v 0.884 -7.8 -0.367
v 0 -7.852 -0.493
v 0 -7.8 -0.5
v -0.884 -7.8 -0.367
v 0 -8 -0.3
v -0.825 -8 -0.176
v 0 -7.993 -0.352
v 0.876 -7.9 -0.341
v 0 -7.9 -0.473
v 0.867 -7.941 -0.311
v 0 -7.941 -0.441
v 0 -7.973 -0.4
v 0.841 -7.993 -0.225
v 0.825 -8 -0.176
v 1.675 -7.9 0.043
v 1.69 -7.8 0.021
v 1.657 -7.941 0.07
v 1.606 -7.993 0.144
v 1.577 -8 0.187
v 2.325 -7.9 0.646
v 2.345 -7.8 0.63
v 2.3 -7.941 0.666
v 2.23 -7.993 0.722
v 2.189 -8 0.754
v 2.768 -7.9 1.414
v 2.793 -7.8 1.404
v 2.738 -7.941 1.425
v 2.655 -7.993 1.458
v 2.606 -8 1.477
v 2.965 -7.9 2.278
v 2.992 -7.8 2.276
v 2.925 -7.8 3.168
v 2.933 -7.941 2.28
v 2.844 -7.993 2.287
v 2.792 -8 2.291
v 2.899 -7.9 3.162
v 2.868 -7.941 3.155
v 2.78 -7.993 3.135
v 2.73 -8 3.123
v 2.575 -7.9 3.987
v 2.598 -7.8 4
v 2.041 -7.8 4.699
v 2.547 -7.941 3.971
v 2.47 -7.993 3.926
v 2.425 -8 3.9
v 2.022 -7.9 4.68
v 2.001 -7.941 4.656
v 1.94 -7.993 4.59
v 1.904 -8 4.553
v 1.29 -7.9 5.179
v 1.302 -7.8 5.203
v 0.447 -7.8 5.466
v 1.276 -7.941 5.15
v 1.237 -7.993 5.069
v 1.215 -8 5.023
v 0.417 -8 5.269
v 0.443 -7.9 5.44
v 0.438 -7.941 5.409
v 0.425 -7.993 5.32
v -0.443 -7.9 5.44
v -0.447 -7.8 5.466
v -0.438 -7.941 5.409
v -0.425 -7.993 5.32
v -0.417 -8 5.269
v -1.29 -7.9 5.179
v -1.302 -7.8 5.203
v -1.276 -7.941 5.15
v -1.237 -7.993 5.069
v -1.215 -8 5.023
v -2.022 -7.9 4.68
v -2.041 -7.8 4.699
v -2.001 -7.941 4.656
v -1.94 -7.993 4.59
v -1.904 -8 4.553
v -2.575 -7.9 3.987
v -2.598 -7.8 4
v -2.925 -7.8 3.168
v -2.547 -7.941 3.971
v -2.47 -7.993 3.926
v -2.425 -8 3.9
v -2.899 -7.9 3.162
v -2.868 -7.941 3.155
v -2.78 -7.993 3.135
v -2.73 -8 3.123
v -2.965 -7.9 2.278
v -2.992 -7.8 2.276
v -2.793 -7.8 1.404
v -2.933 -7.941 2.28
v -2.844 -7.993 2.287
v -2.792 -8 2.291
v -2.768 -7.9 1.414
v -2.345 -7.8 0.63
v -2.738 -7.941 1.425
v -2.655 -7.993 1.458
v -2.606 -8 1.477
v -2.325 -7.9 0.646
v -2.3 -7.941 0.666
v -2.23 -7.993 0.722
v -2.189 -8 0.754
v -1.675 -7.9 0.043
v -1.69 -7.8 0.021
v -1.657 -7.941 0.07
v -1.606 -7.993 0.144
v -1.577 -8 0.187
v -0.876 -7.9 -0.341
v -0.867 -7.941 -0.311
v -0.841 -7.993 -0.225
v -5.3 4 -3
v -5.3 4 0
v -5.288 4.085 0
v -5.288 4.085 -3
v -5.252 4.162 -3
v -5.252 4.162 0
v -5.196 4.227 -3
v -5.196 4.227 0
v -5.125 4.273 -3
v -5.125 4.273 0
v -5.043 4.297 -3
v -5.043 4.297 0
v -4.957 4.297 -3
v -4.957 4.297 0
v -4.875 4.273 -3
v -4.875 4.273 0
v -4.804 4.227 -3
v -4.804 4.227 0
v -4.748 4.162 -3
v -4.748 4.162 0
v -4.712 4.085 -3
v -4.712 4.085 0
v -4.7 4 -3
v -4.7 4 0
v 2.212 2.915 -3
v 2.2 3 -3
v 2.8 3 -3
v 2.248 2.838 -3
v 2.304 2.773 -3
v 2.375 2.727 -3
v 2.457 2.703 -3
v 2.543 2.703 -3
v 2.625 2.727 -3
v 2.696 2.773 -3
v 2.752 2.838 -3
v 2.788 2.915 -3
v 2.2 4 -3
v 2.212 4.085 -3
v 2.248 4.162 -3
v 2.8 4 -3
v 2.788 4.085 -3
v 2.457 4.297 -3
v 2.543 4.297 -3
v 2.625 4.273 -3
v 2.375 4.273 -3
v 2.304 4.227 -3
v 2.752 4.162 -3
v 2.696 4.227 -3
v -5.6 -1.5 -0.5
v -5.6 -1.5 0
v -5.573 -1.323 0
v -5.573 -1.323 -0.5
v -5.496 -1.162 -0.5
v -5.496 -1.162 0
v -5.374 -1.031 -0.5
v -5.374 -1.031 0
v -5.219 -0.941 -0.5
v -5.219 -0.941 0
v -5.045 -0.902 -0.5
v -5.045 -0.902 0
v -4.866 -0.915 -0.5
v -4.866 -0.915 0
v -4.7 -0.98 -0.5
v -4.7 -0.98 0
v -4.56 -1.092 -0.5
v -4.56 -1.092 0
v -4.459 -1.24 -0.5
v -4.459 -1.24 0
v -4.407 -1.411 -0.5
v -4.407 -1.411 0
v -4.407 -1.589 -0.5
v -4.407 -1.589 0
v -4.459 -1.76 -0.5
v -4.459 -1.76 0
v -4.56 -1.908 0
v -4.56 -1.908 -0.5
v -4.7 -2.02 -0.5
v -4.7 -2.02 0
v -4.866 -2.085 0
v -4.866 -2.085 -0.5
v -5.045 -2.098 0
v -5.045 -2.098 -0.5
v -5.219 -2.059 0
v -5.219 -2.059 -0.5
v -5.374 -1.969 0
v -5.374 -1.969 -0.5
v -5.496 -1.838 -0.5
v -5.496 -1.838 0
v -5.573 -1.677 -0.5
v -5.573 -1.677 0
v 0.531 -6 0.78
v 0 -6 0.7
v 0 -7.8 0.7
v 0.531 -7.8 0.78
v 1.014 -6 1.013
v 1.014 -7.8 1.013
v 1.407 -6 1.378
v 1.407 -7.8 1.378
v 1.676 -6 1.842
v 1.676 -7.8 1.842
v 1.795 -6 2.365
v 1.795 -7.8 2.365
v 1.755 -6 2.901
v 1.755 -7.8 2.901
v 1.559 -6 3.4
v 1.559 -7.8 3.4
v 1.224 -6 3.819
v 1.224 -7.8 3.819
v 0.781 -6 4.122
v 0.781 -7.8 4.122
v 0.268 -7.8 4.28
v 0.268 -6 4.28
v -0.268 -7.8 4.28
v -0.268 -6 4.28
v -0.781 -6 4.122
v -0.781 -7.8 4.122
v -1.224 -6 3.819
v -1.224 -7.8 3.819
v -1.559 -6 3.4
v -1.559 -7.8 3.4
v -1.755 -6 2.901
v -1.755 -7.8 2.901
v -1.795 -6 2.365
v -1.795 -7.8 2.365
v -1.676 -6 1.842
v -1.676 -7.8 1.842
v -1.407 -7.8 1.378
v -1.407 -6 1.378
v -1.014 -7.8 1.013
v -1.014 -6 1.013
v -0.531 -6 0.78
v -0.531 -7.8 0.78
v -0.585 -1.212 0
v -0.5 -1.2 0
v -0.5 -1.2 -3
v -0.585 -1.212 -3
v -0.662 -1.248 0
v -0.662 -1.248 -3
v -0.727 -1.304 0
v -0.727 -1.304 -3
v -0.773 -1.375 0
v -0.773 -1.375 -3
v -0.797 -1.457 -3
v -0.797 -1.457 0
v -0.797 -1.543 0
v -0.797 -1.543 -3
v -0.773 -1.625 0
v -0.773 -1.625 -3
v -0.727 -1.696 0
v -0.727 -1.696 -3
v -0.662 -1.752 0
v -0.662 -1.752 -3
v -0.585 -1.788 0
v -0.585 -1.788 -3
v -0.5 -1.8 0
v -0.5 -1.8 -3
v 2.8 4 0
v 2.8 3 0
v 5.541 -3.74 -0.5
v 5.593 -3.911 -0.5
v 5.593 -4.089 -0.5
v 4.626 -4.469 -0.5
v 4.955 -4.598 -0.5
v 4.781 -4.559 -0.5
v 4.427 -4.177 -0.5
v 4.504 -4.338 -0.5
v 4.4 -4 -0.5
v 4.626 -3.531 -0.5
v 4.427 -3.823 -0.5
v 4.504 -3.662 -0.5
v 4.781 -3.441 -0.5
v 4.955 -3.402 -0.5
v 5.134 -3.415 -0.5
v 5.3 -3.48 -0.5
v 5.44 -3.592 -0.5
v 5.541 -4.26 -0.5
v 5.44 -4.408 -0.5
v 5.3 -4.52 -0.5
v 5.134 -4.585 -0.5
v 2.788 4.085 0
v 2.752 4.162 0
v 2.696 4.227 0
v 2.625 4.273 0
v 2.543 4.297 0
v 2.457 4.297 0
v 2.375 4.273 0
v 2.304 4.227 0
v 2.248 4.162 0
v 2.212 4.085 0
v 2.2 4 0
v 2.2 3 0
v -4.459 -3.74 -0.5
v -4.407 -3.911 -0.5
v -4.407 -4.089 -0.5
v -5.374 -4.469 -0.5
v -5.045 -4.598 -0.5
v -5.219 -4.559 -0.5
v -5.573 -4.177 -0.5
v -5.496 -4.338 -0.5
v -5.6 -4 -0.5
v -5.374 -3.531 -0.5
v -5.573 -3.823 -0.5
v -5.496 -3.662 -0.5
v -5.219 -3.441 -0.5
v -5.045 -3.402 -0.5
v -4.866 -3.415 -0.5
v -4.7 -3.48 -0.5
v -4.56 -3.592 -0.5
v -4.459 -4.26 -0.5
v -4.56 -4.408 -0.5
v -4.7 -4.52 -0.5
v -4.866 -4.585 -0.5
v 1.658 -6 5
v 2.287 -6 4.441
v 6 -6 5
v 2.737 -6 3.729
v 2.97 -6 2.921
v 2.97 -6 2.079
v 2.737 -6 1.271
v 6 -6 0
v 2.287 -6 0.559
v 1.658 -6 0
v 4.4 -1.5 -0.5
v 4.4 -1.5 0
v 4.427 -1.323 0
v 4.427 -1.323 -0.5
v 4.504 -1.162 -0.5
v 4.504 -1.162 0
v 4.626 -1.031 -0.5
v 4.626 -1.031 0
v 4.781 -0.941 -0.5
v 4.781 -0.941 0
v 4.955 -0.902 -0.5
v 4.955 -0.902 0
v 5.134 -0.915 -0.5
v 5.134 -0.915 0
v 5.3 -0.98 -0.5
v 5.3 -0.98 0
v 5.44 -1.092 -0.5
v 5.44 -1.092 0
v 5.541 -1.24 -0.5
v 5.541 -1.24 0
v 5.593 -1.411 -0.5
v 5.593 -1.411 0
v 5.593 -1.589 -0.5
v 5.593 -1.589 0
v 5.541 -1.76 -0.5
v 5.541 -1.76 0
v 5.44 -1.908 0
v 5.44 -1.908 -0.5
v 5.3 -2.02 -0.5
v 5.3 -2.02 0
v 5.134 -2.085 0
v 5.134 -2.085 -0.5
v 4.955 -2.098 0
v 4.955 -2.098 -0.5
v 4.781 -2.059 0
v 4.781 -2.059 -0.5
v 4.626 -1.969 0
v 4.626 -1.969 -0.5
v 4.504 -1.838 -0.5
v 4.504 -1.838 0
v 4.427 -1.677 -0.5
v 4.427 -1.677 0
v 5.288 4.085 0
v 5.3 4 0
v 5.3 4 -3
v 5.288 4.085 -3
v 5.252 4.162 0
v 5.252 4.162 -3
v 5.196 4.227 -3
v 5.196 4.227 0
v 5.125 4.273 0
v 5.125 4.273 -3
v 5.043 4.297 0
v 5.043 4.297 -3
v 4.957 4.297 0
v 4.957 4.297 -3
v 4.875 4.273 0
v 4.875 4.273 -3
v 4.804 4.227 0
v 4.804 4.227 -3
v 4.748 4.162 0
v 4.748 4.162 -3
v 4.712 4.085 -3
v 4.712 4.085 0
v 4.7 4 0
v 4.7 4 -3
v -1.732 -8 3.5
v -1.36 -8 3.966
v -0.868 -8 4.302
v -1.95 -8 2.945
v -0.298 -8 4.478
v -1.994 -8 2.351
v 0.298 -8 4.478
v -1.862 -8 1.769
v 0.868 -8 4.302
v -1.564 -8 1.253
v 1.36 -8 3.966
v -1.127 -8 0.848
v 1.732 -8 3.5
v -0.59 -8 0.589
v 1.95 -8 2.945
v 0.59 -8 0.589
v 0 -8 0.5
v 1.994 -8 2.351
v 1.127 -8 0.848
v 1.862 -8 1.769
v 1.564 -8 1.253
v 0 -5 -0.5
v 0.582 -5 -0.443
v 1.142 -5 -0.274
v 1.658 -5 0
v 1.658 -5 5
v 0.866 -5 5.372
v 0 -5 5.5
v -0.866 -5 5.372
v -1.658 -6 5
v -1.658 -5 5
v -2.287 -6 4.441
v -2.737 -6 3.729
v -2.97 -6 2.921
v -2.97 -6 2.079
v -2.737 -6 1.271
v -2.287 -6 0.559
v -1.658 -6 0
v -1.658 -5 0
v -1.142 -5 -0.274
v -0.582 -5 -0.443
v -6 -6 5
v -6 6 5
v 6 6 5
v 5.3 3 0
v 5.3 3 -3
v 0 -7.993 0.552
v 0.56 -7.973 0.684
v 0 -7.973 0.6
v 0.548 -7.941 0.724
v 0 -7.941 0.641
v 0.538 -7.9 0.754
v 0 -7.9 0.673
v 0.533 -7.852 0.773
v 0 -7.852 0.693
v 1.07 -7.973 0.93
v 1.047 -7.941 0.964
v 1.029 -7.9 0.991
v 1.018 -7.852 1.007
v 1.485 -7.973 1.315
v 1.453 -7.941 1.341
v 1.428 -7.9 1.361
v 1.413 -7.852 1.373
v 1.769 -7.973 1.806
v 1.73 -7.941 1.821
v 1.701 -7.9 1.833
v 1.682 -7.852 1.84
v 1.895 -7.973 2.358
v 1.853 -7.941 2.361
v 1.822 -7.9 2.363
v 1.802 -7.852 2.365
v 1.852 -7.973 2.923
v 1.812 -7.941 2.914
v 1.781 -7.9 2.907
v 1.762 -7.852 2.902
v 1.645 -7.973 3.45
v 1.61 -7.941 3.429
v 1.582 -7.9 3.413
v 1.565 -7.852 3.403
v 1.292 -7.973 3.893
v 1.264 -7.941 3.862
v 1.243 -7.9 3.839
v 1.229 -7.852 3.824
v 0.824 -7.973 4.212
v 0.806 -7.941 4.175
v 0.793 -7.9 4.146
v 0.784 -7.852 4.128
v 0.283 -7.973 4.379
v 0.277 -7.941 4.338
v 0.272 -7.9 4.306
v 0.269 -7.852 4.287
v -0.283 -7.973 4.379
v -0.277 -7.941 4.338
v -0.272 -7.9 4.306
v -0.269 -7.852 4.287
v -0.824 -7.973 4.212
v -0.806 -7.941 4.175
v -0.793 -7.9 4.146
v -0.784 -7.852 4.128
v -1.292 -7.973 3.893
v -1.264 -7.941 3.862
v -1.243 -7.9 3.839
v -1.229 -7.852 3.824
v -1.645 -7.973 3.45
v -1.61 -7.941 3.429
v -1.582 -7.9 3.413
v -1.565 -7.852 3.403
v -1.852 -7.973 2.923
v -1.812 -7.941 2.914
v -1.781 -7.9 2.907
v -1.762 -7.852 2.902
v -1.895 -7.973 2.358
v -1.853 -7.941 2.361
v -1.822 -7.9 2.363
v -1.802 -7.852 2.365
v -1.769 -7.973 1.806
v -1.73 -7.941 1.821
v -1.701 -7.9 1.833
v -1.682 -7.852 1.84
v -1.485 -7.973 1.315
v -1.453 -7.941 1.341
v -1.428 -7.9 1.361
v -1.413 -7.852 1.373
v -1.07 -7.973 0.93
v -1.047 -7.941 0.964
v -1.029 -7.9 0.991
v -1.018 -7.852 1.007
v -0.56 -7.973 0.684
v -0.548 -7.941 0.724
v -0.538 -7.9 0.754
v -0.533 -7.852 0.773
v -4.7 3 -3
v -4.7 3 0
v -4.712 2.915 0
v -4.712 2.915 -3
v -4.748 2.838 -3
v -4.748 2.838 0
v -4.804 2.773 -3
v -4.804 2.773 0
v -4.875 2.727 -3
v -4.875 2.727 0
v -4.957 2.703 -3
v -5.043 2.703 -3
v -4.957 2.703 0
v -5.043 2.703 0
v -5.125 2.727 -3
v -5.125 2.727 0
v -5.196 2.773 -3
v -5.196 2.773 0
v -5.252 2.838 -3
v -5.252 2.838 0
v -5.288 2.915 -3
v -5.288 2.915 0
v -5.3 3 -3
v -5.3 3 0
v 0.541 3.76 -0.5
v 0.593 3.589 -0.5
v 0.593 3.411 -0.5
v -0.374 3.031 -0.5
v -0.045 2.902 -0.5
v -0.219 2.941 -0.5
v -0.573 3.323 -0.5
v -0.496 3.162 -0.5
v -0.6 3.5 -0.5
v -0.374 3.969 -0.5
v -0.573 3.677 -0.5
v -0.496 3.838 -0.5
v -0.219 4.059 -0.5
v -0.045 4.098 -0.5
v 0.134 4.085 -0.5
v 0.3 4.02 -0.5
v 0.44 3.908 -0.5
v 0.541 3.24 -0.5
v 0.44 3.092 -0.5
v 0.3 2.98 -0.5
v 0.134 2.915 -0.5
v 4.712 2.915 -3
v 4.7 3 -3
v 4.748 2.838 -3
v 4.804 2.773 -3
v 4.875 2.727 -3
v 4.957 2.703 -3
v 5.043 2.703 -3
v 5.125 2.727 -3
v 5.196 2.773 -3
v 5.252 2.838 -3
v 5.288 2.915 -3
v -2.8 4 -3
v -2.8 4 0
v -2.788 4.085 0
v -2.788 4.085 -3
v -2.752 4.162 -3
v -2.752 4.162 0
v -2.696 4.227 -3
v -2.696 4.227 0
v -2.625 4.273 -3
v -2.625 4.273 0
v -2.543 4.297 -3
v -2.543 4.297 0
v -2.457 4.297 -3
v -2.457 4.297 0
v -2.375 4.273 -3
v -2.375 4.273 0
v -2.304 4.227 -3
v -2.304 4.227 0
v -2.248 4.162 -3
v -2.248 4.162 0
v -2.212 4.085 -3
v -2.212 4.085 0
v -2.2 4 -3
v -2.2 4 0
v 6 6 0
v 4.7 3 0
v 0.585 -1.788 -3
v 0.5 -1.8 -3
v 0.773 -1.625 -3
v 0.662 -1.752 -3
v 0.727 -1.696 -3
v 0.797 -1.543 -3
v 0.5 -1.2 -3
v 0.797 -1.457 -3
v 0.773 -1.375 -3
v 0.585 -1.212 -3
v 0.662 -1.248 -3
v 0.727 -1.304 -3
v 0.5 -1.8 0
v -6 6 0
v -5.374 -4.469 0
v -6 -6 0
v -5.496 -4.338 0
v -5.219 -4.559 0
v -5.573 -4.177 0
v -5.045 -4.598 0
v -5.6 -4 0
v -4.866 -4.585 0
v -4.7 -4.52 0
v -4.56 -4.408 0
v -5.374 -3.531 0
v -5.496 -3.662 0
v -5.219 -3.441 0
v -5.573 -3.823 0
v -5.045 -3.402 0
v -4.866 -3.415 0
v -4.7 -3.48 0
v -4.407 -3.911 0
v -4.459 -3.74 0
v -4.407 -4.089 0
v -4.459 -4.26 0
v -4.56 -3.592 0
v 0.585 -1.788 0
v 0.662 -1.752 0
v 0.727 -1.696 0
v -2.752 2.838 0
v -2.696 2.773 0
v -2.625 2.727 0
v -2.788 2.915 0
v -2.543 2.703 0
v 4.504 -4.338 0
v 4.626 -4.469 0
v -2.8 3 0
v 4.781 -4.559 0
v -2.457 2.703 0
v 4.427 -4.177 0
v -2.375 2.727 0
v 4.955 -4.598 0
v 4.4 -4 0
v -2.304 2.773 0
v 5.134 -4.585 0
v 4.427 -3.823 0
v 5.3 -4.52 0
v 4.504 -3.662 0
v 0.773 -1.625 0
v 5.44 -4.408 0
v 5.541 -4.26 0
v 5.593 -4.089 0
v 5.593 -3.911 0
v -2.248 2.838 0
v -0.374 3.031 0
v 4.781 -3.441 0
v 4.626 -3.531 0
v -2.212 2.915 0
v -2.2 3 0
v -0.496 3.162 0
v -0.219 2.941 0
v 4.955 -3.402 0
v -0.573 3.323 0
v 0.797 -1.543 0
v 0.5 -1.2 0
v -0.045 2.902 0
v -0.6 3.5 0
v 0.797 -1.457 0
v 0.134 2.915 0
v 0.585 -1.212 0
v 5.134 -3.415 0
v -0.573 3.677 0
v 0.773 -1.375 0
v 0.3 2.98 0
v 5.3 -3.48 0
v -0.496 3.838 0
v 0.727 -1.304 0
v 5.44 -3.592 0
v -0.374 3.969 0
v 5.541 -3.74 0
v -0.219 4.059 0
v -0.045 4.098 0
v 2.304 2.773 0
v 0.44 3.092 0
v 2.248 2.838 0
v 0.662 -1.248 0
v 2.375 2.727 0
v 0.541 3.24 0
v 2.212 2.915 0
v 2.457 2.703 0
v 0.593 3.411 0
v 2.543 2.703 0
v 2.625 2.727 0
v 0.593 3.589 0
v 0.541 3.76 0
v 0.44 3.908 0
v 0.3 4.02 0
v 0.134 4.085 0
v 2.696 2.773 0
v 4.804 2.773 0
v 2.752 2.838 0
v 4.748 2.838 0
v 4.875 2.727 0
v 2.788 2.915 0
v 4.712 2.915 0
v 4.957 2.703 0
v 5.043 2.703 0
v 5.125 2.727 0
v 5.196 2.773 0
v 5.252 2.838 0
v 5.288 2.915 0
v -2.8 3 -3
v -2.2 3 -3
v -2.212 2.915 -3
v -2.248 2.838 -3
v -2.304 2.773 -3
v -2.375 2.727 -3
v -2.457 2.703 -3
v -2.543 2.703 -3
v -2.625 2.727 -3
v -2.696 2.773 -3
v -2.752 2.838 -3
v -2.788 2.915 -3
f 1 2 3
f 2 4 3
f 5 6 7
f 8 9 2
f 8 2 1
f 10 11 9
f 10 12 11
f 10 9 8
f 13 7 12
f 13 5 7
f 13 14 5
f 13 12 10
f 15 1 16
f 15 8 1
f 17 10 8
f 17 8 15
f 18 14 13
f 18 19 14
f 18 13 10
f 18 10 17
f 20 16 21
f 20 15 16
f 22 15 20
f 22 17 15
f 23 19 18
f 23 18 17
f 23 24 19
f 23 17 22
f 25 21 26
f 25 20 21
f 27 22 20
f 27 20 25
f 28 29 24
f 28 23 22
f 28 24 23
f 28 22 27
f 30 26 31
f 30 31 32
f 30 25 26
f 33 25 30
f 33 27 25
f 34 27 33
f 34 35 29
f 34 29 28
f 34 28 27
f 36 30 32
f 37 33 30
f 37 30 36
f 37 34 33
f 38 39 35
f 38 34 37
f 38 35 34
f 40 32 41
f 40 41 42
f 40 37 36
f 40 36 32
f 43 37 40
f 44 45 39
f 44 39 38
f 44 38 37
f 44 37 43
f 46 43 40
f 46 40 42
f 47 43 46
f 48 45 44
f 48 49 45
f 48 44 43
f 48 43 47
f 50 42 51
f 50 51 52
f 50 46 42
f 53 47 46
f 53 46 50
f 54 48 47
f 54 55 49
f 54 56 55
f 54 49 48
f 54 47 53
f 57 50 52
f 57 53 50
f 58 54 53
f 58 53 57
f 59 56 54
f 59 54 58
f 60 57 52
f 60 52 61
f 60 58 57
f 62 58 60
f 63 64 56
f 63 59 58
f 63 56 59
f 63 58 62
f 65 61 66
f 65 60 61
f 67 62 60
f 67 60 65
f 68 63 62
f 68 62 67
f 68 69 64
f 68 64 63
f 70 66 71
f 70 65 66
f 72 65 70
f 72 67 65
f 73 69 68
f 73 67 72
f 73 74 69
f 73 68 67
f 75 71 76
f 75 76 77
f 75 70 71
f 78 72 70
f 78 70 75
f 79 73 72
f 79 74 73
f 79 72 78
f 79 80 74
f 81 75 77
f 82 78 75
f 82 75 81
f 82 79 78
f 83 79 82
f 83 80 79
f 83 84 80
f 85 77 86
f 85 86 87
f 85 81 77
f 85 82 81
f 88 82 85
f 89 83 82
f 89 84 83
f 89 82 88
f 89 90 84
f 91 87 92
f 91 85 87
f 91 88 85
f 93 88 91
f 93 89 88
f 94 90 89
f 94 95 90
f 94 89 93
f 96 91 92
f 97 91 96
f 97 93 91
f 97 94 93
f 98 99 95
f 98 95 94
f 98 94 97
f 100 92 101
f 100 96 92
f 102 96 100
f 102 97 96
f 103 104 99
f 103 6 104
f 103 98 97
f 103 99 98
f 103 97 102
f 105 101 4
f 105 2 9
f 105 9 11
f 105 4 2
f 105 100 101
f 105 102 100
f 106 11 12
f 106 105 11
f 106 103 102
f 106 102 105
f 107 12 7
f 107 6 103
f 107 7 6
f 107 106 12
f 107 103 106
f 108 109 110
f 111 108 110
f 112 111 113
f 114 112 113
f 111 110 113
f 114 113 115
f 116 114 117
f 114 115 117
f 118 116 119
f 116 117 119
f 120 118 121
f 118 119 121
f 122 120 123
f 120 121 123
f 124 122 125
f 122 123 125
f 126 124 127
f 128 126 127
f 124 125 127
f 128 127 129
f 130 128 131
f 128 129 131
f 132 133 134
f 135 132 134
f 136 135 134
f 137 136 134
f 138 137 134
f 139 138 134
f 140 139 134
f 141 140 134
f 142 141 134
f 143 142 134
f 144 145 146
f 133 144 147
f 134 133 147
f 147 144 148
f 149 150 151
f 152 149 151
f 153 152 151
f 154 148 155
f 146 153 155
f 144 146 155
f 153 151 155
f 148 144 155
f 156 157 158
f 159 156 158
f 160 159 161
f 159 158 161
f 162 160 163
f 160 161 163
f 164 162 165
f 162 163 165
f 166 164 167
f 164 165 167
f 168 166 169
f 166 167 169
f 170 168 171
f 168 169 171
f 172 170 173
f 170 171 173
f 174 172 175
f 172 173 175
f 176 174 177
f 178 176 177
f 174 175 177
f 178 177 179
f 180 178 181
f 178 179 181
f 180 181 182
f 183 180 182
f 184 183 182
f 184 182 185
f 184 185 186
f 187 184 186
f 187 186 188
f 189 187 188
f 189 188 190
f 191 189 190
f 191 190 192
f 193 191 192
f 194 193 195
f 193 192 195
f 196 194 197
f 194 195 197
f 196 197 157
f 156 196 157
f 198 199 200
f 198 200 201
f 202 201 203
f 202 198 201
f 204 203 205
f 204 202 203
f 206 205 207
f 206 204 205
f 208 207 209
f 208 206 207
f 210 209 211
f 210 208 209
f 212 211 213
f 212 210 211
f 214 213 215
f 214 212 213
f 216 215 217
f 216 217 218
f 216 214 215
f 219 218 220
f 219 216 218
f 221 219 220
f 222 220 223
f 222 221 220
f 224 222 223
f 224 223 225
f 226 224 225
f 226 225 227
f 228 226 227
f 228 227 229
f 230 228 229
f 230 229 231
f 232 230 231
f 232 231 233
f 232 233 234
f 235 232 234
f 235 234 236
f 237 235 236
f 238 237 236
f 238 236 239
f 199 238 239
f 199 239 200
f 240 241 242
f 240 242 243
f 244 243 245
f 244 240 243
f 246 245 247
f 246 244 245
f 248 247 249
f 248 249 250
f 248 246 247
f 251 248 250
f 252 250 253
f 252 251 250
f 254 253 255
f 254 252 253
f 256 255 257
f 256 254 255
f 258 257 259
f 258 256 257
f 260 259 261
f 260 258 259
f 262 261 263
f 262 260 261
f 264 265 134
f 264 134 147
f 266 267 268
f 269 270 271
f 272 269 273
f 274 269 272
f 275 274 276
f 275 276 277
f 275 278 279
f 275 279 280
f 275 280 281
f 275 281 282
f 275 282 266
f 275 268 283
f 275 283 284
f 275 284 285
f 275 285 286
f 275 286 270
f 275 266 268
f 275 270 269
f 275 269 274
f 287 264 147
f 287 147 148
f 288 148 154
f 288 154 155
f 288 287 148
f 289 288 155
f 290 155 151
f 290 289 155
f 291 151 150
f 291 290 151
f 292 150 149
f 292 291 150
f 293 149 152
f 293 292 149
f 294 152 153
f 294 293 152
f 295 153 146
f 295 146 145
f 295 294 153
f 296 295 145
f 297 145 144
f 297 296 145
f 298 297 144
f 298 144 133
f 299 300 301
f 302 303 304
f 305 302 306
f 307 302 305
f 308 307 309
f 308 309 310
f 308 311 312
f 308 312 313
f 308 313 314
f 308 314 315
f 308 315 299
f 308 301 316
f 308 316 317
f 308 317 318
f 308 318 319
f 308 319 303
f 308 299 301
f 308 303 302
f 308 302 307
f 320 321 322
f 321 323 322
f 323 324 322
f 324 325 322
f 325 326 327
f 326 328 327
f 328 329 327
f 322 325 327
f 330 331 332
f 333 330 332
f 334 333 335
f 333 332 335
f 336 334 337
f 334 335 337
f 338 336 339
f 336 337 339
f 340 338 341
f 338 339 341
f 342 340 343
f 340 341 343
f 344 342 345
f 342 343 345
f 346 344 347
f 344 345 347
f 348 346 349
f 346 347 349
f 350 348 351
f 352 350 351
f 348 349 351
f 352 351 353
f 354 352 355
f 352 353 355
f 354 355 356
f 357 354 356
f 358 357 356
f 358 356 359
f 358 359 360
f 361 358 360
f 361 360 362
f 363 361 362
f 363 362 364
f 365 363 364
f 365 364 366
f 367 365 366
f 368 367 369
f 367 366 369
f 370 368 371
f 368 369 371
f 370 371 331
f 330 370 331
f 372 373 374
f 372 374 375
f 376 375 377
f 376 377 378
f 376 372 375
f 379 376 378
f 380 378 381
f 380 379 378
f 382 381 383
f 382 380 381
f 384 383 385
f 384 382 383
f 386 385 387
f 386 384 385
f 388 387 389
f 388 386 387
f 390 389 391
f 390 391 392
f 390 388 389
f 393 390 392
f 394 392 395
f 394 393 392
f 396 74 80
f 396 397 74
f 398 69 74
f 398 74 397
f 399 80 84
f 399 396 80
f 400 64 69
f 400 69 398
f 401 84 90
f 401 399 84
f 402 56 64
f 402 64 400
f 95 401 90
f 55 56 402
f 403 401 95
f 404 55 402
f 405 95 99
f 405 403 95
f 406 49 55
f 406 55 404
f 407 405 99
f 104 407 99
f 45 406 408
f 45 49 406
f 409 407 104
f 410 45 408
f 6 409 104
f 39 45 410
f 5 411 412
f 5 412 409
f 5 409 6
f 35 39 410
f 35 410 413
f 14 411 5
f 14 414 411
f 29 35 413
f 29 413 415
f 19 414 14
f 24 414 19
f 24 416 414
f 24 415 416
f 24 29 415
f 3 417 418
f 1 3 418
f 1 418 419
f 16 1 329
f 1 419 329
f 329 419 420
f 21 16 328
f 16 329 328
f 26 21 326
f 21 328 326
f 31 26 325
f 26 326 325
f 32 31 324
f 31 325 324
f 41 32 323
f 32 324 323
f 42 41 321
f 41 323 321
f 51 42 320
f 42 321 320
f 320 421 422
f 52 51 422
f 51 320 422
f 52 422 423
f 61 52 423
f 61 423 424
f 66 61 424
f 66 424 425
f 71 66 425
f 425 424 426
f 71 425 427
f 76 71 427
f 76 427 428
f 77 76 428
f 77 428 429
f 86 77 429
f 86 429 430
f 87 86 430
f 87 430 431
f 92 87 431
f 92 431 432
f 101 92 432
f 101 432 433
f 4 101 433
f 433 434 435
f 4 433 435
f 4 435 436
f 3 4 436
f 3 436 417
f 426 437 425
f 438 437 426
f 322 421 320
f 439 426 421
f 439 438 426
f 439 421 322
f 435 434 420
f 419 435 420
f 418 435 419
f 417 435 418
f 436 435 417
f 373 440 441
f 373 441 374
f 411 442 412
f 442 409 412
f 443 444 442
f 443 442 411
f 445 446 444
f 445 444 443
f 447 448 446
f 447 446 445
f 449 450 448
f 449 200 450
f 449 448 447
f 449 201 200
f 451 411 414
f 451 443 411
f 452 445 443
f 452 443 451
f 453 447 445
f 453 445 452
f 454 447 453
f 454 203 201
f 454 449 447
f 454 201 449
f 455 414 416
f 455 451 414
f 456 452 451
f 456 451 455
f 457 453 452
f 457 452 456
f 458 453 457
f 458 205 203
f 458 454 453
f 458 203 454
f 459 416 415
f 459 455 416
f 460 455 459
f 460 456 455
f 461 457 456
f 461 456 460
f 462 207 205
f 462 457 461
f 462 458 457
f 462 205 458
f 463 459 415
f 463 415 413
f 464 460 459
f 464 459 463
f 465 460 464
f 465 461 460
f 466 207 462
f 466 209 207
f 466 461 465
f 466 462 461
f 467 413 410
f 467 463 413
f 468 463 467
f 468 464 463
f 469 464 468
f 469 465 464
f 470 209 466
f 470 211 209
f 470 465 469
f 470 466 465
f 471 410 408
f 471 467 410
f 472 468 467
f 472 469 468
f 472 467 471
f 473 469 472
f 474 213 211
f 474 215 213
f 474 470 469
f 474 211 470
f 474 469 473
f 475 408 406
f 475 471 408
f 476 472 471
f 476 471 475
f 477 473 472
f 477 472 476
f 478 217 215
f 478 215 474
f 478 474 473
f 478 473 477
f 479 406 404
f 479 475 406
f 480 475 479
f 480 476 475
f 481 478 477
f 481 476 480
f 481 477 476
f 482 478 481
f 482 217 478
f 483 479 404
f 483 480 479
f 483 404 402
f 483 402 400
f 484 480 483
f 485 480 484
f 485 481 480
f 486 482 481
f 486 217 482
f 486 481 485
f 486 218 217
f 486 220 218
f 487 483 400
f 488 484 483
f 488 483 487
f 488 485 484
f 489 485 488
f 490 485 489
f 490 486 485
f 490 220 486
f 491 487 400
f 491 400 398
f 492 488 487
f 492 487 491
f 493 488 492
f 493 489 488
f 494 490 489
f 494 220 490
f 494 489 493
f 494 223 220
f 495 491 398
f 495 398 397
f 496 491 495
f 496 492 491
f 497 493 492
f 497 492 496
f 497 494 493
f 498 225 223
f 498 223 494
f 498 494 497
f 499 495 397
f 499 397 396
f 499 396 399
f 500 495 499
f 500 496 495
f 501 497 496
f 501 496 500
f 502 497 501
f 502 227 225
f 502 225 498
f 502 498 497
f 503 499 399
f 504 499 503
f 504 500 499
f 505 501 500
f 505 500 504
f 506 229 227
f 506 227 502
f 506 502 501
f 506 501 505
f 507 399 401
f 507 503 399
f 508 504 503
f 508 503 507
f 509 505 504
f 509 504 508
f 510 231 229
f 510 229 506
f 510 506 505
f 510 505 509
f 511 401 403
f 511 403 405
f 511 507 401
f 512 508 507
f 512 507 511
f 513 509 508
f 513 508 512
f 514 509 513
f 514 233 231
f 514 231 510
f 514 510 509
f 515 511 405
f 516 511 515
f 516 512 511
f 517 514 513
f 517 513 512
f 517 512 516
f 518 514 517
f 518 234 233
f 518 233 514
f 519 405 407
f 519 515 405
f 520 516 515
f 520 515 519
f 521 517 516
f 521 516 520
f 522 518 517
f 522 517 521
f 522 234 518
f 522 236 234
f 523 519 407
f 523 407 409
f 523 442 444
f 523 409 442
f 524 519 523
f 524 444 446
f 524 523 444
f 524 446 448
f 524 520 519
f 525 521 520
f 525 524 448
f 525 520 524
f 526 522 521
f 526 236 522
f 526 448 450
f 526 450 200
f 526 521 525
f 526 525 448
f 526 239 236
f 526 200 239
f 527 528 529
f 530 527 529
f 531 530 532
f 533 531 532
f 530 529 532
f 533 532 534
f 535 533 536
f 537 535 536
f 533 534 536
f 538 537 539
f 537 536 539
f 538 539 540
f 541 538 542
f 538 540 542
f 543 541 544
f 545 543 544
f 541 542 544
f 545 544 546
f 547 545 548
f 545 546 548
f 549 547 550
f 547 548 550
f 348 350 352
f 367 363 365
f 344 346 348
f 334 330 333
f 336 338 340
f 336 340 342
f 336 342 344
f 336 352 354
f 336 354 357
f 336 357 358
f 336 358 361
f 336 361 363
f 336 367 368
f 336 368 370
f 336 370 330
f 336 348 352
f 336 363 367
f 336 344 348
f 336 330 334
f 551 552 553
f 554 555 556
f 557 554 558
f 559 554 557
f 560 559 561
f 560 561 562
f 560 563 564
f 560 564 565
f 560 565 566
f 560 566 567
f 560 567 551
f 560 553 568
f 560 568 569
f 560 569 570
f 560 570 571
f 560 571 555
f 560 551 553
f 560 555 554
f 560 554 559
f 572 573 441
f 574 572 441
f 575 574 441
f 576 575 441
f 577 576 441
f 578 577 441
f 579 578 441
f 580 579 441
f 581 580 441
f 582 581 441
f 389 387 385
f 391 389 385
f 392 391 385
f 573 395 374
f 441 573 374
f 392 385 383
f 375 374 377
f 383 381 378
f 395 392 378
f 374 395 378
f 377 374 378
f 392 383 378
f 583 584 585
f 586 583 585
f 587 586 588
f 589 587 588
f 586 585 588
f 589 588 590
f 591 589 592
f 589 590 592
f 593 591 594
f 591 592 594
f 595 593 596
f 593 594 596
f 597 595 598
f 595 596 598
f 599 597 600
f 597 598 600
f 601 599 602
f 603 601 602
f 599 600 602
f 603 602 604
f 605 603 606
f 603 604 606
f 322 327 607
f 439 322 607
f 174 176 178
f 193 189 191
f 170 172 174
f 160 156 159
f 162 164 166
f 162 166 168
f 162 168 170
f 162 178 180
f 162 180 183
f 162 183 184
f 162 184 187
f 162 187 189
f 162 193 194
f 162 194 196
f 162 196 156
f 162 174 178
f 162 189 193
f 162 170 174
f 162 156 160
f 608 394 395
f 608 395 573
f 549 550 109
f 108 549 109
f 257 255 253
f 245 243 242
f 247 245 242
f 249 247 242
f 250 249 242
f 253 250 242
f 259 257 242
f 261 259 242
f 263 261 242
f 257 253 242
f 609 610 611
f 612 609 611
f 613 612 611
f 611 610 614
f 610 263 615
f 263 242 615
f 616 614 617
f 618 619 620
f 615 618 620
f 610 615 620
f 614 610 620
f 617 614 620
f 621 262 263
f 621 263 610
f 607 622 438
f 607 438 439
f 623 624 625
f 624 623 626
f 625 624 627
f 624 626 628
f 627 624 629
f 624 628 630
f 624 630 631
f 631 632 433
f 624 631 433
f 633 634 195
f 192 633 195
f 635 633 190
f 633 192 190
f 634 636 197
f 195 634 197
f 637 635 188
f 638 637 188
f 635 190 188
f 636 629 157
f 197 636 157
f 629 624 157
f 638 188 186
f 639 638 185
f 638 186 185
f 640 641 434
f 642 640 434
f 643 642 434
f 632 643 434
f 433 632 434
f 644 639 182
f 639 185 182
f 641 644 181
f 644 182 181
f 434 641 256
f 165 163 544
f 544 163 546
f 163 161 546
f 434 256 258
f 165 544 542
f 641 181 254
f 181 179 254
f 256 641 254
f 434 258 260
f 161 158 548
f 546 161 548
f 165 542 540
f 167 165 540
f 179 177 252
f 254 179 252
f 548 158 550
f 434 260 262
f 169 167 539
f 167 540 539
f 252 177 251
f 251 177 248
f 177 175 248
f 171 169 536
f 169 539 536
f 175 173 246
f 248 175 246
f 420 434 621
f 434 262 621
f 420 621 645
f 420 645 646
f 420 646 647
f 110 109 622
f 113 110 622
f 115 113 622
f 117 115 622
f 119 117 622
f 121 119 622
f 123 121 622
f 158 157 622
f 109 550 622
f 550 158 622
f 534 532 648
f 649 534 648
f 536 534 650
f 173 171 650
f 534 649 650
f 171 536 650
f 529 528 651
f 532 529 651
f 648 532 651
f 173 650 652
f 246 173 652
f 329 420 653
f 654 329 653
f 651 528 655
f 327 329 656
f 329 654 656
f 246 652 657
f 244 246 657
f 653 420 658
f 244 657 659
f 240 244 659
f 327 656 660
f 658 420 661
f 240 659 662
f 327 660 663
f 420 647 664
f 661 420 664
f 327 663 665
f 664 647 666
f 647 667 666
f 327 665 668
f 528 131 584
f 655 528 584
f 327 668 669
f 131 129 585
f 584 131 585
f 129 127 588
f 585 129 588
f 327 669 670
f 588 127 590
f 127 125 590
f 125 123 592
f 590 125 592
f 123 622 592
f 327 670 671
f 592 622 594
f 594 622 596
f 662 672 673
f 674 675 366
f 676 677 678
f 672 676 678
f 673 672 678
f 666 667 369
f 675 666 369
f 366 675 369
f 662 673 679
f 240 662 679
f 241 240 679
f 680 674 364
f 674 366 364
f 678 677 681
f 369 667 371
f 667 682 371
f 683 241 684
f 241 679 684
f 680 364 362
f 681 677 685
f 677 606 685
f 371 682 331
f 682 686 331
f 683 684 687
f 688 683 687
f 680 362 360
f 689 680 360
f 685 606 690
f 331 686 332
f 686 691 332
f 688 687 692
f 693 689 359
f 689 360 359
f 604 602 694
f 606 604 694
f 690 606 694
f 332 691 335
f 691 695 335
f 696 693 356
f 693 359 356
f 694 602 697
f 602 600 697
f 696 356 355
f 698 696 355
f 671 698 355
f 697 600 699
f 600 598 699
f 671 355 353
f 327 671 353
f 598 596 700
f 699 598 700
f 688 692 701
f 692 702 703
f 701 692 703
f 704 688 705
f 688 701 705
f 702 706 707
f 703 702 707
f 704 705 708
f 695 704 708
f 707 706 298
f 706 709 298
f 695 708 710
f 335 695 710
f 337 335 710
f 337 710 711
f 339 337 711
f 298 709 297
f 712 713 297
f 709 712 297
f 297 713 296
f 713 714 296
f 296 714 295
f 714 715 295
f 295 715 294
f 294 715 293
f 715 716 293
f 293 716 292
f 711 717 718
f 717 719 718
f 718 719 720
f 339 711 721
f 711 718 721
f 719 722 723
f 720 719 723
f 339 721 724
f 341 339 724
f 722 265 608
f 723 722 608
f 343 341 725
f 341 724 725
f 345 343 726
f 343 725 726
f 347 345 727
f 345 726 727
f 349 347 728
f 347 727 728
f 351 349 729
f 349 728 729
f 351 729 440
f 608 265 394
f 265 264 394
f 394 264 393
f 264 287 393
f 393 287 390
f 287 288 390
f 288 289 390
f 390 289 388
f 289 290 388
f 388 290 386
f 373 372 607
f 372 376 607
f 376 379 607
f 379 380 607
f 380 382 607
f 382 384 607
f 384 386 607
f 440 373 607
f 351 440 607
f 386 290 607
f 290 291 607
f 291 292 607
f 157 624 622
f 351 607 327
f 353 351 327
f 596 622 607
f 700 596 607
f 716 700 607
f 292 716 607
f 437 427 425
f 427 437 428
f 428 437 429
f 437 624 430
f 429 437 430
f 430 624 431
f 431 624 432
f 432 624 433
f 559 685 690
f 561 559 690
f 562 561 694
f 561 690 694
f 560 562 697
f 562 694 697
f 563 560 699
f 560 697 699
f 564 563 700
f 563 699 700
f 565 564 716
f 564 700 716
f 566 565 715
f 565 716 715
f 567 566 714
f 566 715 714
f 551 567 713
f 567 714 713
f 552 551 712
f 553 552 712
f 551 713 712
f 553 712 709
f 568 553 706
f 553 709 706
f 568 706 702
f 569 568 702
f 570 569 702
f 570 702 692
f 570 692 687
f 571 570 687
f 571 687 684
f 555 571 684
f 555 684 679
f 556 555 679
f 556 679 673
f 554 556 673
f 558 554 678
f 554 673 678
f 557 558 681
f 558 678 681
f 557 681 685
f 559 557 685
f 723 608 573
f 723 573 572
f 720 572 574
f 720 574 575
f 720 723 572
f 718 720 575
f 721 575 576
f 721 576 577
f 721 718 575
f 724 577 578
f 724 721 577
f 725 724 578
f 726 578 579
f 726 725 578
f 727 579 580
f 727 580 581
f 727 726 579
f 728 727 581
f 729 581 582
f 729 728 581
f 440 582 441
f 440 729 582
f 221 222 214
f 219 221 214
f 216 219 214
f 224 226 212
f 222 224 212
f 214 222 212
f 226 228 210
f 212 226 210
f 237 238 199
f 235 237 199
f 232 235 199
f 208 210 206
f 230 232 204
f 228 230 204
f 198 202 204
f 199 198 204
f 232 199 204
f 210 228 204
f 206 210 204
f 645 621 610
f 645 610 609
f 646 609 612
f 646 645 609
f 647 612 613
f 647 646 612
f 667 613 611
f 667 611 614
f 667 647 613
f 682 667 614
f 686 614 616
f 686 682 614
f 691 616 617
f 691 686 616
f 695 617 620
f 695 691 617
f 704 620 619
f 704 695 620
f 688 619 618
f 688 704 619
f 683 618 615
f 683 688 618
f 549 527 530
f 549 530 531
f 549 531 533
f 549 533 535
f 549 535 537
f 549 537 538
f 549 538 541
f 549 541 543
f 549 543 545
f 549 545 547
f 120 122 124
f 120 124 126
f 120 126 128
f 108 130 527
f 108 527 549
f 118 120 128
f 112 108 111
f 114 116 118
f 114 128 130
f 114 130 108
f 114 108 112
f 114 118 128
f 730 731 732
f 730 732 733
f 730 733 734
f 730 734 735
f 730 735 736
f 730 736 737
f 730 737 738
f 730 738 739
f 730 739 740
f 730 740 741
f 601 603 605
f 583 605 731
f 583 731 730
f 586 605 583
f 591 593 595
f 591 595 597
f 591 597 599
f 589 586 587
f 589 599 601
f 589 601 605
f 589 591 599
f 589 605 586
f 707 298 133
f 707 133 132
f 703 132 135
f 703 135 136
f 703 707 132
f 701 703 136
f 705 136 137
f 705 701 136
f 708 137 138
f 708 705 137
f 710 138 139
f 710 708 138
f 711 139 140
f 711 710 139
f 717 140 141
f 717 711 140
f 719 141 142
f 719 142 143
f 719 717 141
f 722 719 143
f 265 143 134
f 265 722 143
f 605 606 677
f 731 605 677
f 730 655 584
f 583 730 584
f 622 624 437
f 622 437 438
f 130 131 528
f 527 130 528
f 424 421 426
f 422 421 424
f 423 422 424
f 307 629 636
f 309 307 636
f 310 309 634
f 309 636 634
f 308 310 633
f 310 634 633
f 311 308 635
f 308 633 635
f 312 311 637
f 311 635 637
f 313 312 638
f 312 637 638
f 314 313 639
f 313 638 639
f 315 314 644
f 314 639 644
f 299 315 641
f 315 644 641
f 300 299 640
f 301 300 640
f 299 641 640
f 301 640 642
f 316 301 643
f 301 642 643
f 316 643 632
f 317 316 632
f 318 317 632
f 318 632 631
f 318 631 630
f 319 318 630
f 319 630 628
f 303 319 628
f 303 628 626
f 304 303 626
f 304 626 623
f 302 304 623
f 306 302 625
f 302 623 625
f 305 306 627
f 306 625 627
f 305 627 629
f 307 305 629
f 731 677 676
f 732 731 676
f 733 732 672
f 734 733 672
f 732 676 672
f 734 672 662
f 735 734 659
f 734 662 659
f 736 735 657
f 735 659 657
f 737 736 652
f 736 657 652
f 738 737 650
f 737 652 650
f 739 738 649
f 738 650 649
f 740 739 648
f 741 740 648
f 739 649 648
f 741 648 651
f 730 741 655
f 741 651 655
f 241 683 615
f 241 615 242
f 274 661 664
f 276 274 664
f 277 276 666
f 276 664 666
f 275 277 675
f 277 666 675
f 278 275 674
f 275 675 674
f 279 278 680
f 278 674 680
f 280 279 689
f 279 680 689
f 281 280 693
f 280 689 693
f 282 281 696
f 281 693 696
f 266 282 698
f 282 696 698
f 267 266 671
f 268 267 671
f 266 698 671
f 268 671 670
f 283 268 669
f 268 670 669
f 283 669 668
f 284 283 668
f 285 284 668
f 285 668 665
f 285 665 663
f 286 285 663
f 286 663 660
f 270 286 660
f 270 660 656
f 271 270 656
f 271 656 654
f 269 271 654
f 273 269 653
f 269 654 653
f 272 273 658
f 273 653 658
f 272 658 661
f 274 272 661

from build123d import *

# Parameters (mm, degrees)
SKETCH1_W                = 12
SKETCH1_H                = 12
BOSS_EXTRUDE1_DEPTH      = 5
BOSS_EXTRUDE2_DEPTH      = 2
BOSS_EXTRUDE2_DEPTH_BACK = 1
SKETCH2_R                = 3
SKETCH2_R_2              = 1.8
FILLET1_R                = 0.2
SKETCH3_R                = 0.6
BOSS_EXTRUDE3_DEPTH      = 0.5
BOSS_EXTRUDE4_DEPTH      = 3


with BuildPart() as part:
    # Sketch1 → Boss-Extrude1 (new body)
    with BuildSketch(Plane.XY):
        Rectangle(SKETCH1_W, SKETCH1_H)
    extrude(amount=BOSS_EXTRUDE1_DEPTH)

    # Sketch2 → Boss-Extrude2 (add, two sides: drawn at the far end of the back side and taken through both)
    with BuildSketch(Plane.XZ.offset(6).offset(-BOSS_EXTRUDE2_DEPTH_BACK)):
        with Locations((0, 2.5)):
            Circle(SKETCH2_R)
        with Locations((0, 2.5)):
            Circle(SKETCH2_R_2, mode=Mode.SUBTRACT)
    extrude(amount=BOSS_EXTRUDE2_DEPTH + BOSS_EXTRUDE2_DEPTH_BACK)

    # Fillet1
    fillet1_edges = [part.edges().sort_by_distance(p)[0] for p in [
        (-1.8, -8, 2.5),
        (-3, -8, 2.5),
    ]]
    fillet(fillet1_edges, radius=FILLET1_R)

    # Sketch3 → Boss-Extrude3 (add)
    with BuildSketch(Plane(origin=(0, 0, 0), x_dir=(-1, 0, 0), z_dir=(0, 0, -1))):
        with Locations((-5, -4)):
            Circle(SKETCH3_R)
        with Locations((5, -4)):
            Circle(SKETCH3_R)
        with Locations((-5, -1.5)):
            Circle(SKETCH3_R)
        with Locations((5, -1.5)):
            Circle(SKETCH3_R)
        with Locations((0, 3.5)):
            Circle(SKETCH3_R)
    extrude(amount=BOSS_EXTRUDE3_DEPTH)

    # Sketch3<3> → Boss-Extrude4 (add)
    with BuildSketch(Plane(origin=(0, 0, 0), x_dir=(-1, 0, 0), z_dir=(0, 0, -1))):
        with BuildLine():
            Line((-0.5, -1.2), (0.5, -1.2))
            ThreePointArc((0.5, -1.2), (0.8, -1.5), (0.5, -1.8))
            Line((0.5, -1.8), (-0.5, -1.8))
            ThreePointArc((-0.5, -1.8), (-0.8, -1.5), (-0.5, -1.2))
        make_face()
        with BuildLine():
            Line((-4.7, 4), (-4.7, 3))
            ThreePointArc((-4.7, 3), (-5, 2.7), (-5.3, 3))
            Line((-5.3, 3), (-5.3, 4))
            ThreePointArc((-5.3, 4), (-5, 4.3), (-4.7, 4))
        make_face()
        with BuildLine():
            Line((-2.2, 4), (-2.2, 3))
            ThreePointArc((-2.2, 3), (-2.5, 2.7), (-2.8, 3))
            Line((-2.8, 3), (-2.8, 4))
            ThreePointArc((-2.8, 4), (-2.5, 4.3), (-2.2, 4))
        make_face()
        with BuildLine():
            Line((4.7, 4), (4.7, 3))
            ThreePointArc((4.7, 3), (5, 2.7), (5.3, 3))
            Line((5.3, 3), (5.3, 4))
            ThreePointArc((5.3, 4), (5, 4.3), (4.7, 4))
        make_face()
        with BuildLine():
            Line((2.2, 4), (2.2, 3))
            ThreePointArc((2.2, 3), (2.5, 2.7), (2.8, 3))
            Line((2.8, 3), (2.8, 4))
            ThreePointArc((2.8, 4), (2.5, 4.3), (2.2, 4))
        make_face()
    extrude(amount=BOSS_EXTRUDE4_DEPTH)


solid = part.part
